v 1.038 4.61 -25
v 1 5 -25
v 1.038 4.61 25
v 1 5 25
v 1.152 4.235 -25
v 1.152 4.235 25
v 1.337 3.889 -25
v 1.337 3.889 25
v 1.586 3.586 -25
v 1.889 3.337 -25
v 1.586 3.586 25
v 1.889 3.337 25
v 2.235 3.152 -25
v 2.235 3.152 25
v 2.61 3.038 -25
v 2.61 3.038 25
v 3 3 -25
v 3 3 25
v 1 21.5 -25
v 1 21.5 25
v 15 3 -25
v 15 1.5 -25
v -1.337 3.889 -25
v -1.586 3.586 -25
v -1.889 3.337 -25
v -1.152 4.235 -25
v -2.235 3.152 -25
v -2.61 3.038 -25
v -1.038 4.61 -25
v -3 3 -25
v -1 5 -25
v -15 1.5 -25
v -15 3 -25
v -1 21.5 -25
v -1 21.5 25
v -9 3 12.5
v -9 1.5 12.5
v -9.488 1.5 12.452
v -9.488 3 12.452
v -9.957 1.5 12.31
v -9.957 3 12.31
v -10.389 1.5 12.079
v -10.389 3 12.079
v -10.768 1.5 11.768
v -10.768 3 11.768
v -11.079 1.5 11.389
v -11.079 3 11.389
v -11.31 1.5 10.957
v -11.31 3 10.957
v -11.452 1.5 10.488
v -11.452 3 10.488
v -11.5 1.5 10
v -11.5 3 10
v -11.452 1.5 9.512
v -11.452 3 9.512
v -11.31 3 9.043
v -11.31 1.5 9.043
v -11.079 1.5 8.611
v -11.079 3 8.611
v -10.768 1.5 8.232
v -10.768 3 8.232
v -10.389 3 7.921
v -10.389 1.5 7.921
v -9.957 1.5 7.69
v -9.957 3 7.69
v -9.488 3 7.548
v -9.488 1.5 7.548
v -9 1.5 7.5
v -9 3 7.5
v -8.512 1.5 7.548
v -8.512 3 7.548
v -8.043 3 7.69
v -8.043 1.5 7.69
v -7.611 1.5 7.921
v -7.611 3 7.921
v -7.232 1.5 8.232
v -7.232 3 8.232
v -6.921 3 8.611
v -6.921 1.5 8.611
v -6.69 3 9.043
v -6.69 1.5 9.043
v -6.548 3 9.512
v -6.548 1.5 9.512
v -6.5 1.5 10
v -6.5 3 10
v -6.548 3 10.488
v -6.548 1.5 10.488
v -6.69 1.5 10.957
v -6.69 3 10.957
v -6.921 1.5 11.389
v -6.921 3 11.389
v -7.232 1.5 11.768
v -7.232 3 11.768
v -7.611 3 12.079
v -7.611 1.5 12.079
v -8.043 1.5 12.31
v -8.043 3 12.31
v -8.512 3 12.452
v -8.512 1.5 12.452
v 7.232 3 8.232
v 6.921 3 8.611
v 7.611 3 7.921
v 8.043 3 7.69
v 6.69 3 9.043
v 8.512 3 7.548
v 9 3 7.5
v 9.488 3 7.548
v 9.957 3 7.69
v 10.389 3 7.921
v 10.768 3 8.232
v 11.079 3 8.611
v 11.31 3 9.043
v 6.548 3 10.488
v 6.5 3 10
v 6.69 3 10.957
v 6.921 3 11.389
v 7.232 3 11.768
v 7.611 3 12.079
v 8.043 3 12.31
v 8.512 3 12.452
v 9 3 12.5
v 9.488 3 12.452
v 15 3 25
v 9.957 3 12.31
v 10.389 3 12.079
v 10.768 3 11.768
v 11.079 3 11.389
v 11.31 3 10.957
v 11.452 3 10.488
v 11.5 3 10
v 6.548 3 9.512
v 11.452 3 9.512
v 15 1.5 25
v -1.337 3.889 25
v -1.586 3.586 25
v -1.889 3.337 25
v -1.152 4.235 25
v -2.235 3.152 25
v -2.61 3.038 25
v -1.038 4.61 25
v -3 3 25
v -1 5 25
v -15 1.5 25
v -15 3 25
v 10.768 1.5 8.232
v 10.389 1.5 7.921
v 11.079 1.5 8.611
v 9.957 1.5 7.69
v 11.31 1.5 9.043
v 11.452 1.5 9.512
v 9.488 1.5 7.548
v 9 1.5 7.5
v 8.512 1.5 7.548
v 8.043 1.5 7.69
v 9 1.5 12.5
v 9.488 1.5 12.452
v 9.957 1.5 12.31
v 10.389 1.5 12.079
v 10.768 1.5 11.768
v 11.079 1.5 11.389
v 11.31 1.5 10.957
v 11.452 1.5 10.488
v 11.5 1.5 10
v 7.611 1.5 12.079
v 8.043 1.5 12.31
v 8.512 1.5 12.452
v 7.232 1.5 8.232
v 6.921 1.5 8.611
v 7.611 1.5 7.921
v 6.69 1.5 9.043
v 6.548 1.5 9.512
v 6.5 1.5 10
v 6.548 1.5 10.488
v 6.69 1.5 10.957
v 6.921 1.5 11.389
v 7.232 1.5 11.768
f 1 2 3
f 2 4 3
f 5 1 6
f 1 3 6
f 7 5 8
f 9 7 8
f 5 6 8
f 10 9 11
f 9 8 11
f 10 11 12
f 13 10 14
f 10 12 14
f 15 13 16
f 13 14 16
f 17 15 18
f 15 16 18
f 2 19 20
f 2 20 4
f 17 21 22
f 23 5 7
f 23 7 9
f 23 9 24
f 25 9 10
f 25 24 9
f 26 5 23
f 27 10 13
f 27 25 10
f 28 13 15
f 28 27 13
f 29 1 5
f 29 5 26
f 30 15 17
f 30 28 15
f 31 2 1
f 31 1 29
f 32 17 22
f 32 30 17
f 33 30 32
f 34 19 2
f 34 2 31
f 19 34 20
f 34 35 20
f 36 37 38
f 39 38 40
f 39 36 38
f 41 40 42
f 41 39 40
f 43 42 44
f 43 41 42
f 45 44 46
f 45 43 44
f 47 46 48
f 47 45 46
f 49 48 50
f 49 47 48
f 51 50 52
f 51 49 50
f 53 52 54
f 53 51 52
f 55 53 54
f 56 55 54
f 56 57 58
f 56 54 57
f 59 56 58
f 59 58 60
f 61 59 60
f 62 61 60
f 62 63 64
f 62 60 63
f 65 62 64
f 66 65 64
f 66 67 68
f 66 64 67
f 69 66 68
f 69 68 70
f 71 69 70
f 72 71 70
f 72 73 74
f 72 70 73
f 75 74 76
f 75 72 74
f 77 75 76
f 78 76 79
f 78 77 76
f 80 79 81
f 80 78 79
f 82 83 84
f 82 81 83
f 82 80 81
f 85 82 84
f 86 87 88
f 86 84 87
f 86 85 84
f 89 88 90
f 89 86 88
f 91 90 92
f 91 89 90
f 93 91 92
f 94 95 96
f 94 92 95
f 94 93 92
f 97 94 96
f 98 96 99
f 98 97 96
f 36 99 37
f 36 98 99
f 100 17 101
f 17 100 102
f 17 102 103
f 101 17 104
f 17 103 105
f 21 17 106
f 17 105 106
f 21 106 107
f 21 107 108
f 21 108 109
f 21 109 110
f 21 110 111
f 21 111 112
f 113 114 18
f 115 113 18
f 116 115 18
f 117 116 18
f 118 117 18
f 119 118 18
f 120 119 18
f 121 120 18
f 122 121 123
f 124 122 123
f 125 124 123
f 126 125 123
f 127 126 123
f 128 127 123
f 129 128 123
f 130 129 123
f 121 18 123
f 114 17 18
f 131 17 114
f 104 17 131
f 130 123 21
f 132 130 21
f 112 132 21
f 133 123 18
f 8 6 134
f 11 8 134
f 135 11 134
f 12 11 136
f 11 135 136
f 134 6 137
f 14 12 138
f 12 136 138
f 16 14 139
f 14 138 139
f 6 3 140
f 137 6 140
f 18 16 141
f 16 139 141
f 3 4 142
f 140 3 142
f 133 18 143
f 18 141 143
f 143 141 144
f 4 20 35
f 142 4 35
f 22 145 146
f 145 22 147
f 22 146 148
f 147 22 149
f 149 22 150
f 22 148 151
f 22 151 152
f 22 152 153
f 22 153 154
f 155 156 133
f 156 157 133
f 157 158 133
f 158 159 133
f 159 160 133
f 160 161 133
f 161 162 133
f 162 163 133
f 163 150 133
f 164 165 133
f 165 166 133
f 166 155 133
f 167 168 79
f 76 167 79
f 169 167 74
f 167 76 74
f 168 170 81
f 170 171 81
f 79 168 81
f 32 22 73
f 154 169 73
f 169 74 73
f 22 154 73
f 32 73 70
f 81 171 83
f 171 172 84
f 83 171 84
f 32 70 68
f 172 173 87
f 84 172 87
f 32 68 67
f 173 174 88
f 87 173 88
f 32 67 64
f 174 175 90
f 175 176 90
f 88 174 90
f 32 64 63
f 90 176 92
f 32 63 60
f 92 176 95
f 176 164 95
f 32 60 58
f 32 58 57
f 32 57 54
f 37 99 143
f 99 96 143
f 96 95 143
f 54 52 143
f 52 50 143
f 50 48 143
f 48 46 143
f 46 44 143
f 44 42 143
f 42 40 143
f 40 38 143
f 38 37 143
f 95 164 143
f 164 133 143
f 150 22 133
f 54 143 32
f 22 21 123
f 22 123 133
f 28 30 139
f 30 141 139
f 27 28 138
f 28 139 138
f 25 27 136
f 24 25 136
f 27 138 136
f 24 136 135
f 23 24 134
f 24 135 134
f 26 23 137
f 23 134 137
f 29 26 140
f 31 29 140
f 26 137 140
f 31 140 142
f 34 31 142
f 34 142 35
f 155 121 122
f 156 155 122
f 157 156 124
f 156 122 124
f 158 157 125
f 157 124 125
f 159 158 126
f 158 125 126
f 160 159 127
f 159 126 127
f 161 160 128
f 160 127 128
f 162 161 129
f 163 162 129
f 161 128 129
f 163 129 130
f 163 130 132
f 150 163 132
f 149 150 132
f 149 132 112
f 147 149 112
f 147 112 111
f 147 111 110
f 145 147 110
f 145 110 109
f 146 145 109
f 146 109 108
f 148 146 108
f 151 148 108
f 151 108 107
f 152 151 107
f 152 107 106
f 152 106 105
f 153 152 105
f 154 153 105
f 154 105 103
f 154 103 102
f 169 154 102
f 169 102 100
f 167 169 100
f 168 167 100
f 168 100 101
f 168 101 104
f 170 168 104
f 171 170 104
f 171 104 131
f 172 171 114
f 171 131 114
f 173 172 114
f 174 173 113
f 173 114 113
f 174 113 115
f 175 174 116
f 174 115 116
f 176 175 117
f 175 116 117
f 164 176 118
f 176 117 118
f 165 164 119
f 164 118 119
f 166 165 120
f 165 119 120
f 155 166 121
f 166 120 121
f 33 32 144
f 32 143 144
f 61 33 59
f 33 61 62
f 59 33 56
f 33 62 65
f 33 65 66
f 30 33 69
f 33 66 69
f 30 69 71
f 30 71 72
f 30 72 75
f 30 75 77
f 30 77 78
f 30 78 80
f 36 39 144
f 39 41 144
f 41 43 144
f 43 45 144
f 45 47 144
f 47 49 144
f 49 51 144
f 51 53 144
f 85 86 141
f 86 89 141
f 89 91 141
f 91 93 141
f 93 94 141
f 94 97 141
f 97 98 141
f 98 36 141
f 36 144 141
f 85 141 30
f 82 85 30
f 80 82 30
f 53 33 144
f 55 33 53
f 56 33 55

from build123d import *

# Parameters (mm, degrees)
EXTRUDE_3_DEPTH     = 25
SKETCH_5_R          = 2.5
CUT_EXTRUDE_1_DEPTH = 35.528973341


with BuildPart() as part:
    # 草图3 → 凸台-拉伸3 (new, symmetric)
    with BuildSketch(Plane.XY):
        with BuildLine():
            Line((15, 1.5), (-15, 1.5))
            Line((-15, 1.5), (-15, 3))
            Line((-15, 3), (-3, 3))
            ThreePointArc((-3, 3), (-1.585786438, 3.585786438), (-1, 5))
            Line((-1, 5), (-1, 21.5))
            Line((-1, 21.5), (1, 21.5))
            Line((1, 21.5), (1, 5))
            ThreePointArc((1, 5), (1.585786438, 3.585786438), (3, 3))
            Line((3, 3), (15, 3))
            Line((15, 3), (15, 1.5))
        make_face()
    extrude(amount=EXTRUDE_3_DEPTH, both=True)

    # 草图5 → 切除-拉伸1 (cut, through all)
    with BuildSketch(Plane(origin=(0, 3, 0), x_dir=(1, 0, 0), z_dir=(0, 1, 0))):
        with Locations(Location((9, -10, 0), (0, 0, 270))):
            Circle(SKETCH_5_R)
    cut_extrude_1 = extrude(amount=-CUT_EXTRUDE_1_DEPTH, mode=Mode.SUBTRACT)

    # 镜向1: 切除-拉伸1 across plane
    add(cut_extrude_1.mirror(Plane(origin=(0, 0, 0), x_dir=(0, 0, 1), z_dir=(1, 0, 0))), mode=Mode.SUBTRACT)


solid = part.part
